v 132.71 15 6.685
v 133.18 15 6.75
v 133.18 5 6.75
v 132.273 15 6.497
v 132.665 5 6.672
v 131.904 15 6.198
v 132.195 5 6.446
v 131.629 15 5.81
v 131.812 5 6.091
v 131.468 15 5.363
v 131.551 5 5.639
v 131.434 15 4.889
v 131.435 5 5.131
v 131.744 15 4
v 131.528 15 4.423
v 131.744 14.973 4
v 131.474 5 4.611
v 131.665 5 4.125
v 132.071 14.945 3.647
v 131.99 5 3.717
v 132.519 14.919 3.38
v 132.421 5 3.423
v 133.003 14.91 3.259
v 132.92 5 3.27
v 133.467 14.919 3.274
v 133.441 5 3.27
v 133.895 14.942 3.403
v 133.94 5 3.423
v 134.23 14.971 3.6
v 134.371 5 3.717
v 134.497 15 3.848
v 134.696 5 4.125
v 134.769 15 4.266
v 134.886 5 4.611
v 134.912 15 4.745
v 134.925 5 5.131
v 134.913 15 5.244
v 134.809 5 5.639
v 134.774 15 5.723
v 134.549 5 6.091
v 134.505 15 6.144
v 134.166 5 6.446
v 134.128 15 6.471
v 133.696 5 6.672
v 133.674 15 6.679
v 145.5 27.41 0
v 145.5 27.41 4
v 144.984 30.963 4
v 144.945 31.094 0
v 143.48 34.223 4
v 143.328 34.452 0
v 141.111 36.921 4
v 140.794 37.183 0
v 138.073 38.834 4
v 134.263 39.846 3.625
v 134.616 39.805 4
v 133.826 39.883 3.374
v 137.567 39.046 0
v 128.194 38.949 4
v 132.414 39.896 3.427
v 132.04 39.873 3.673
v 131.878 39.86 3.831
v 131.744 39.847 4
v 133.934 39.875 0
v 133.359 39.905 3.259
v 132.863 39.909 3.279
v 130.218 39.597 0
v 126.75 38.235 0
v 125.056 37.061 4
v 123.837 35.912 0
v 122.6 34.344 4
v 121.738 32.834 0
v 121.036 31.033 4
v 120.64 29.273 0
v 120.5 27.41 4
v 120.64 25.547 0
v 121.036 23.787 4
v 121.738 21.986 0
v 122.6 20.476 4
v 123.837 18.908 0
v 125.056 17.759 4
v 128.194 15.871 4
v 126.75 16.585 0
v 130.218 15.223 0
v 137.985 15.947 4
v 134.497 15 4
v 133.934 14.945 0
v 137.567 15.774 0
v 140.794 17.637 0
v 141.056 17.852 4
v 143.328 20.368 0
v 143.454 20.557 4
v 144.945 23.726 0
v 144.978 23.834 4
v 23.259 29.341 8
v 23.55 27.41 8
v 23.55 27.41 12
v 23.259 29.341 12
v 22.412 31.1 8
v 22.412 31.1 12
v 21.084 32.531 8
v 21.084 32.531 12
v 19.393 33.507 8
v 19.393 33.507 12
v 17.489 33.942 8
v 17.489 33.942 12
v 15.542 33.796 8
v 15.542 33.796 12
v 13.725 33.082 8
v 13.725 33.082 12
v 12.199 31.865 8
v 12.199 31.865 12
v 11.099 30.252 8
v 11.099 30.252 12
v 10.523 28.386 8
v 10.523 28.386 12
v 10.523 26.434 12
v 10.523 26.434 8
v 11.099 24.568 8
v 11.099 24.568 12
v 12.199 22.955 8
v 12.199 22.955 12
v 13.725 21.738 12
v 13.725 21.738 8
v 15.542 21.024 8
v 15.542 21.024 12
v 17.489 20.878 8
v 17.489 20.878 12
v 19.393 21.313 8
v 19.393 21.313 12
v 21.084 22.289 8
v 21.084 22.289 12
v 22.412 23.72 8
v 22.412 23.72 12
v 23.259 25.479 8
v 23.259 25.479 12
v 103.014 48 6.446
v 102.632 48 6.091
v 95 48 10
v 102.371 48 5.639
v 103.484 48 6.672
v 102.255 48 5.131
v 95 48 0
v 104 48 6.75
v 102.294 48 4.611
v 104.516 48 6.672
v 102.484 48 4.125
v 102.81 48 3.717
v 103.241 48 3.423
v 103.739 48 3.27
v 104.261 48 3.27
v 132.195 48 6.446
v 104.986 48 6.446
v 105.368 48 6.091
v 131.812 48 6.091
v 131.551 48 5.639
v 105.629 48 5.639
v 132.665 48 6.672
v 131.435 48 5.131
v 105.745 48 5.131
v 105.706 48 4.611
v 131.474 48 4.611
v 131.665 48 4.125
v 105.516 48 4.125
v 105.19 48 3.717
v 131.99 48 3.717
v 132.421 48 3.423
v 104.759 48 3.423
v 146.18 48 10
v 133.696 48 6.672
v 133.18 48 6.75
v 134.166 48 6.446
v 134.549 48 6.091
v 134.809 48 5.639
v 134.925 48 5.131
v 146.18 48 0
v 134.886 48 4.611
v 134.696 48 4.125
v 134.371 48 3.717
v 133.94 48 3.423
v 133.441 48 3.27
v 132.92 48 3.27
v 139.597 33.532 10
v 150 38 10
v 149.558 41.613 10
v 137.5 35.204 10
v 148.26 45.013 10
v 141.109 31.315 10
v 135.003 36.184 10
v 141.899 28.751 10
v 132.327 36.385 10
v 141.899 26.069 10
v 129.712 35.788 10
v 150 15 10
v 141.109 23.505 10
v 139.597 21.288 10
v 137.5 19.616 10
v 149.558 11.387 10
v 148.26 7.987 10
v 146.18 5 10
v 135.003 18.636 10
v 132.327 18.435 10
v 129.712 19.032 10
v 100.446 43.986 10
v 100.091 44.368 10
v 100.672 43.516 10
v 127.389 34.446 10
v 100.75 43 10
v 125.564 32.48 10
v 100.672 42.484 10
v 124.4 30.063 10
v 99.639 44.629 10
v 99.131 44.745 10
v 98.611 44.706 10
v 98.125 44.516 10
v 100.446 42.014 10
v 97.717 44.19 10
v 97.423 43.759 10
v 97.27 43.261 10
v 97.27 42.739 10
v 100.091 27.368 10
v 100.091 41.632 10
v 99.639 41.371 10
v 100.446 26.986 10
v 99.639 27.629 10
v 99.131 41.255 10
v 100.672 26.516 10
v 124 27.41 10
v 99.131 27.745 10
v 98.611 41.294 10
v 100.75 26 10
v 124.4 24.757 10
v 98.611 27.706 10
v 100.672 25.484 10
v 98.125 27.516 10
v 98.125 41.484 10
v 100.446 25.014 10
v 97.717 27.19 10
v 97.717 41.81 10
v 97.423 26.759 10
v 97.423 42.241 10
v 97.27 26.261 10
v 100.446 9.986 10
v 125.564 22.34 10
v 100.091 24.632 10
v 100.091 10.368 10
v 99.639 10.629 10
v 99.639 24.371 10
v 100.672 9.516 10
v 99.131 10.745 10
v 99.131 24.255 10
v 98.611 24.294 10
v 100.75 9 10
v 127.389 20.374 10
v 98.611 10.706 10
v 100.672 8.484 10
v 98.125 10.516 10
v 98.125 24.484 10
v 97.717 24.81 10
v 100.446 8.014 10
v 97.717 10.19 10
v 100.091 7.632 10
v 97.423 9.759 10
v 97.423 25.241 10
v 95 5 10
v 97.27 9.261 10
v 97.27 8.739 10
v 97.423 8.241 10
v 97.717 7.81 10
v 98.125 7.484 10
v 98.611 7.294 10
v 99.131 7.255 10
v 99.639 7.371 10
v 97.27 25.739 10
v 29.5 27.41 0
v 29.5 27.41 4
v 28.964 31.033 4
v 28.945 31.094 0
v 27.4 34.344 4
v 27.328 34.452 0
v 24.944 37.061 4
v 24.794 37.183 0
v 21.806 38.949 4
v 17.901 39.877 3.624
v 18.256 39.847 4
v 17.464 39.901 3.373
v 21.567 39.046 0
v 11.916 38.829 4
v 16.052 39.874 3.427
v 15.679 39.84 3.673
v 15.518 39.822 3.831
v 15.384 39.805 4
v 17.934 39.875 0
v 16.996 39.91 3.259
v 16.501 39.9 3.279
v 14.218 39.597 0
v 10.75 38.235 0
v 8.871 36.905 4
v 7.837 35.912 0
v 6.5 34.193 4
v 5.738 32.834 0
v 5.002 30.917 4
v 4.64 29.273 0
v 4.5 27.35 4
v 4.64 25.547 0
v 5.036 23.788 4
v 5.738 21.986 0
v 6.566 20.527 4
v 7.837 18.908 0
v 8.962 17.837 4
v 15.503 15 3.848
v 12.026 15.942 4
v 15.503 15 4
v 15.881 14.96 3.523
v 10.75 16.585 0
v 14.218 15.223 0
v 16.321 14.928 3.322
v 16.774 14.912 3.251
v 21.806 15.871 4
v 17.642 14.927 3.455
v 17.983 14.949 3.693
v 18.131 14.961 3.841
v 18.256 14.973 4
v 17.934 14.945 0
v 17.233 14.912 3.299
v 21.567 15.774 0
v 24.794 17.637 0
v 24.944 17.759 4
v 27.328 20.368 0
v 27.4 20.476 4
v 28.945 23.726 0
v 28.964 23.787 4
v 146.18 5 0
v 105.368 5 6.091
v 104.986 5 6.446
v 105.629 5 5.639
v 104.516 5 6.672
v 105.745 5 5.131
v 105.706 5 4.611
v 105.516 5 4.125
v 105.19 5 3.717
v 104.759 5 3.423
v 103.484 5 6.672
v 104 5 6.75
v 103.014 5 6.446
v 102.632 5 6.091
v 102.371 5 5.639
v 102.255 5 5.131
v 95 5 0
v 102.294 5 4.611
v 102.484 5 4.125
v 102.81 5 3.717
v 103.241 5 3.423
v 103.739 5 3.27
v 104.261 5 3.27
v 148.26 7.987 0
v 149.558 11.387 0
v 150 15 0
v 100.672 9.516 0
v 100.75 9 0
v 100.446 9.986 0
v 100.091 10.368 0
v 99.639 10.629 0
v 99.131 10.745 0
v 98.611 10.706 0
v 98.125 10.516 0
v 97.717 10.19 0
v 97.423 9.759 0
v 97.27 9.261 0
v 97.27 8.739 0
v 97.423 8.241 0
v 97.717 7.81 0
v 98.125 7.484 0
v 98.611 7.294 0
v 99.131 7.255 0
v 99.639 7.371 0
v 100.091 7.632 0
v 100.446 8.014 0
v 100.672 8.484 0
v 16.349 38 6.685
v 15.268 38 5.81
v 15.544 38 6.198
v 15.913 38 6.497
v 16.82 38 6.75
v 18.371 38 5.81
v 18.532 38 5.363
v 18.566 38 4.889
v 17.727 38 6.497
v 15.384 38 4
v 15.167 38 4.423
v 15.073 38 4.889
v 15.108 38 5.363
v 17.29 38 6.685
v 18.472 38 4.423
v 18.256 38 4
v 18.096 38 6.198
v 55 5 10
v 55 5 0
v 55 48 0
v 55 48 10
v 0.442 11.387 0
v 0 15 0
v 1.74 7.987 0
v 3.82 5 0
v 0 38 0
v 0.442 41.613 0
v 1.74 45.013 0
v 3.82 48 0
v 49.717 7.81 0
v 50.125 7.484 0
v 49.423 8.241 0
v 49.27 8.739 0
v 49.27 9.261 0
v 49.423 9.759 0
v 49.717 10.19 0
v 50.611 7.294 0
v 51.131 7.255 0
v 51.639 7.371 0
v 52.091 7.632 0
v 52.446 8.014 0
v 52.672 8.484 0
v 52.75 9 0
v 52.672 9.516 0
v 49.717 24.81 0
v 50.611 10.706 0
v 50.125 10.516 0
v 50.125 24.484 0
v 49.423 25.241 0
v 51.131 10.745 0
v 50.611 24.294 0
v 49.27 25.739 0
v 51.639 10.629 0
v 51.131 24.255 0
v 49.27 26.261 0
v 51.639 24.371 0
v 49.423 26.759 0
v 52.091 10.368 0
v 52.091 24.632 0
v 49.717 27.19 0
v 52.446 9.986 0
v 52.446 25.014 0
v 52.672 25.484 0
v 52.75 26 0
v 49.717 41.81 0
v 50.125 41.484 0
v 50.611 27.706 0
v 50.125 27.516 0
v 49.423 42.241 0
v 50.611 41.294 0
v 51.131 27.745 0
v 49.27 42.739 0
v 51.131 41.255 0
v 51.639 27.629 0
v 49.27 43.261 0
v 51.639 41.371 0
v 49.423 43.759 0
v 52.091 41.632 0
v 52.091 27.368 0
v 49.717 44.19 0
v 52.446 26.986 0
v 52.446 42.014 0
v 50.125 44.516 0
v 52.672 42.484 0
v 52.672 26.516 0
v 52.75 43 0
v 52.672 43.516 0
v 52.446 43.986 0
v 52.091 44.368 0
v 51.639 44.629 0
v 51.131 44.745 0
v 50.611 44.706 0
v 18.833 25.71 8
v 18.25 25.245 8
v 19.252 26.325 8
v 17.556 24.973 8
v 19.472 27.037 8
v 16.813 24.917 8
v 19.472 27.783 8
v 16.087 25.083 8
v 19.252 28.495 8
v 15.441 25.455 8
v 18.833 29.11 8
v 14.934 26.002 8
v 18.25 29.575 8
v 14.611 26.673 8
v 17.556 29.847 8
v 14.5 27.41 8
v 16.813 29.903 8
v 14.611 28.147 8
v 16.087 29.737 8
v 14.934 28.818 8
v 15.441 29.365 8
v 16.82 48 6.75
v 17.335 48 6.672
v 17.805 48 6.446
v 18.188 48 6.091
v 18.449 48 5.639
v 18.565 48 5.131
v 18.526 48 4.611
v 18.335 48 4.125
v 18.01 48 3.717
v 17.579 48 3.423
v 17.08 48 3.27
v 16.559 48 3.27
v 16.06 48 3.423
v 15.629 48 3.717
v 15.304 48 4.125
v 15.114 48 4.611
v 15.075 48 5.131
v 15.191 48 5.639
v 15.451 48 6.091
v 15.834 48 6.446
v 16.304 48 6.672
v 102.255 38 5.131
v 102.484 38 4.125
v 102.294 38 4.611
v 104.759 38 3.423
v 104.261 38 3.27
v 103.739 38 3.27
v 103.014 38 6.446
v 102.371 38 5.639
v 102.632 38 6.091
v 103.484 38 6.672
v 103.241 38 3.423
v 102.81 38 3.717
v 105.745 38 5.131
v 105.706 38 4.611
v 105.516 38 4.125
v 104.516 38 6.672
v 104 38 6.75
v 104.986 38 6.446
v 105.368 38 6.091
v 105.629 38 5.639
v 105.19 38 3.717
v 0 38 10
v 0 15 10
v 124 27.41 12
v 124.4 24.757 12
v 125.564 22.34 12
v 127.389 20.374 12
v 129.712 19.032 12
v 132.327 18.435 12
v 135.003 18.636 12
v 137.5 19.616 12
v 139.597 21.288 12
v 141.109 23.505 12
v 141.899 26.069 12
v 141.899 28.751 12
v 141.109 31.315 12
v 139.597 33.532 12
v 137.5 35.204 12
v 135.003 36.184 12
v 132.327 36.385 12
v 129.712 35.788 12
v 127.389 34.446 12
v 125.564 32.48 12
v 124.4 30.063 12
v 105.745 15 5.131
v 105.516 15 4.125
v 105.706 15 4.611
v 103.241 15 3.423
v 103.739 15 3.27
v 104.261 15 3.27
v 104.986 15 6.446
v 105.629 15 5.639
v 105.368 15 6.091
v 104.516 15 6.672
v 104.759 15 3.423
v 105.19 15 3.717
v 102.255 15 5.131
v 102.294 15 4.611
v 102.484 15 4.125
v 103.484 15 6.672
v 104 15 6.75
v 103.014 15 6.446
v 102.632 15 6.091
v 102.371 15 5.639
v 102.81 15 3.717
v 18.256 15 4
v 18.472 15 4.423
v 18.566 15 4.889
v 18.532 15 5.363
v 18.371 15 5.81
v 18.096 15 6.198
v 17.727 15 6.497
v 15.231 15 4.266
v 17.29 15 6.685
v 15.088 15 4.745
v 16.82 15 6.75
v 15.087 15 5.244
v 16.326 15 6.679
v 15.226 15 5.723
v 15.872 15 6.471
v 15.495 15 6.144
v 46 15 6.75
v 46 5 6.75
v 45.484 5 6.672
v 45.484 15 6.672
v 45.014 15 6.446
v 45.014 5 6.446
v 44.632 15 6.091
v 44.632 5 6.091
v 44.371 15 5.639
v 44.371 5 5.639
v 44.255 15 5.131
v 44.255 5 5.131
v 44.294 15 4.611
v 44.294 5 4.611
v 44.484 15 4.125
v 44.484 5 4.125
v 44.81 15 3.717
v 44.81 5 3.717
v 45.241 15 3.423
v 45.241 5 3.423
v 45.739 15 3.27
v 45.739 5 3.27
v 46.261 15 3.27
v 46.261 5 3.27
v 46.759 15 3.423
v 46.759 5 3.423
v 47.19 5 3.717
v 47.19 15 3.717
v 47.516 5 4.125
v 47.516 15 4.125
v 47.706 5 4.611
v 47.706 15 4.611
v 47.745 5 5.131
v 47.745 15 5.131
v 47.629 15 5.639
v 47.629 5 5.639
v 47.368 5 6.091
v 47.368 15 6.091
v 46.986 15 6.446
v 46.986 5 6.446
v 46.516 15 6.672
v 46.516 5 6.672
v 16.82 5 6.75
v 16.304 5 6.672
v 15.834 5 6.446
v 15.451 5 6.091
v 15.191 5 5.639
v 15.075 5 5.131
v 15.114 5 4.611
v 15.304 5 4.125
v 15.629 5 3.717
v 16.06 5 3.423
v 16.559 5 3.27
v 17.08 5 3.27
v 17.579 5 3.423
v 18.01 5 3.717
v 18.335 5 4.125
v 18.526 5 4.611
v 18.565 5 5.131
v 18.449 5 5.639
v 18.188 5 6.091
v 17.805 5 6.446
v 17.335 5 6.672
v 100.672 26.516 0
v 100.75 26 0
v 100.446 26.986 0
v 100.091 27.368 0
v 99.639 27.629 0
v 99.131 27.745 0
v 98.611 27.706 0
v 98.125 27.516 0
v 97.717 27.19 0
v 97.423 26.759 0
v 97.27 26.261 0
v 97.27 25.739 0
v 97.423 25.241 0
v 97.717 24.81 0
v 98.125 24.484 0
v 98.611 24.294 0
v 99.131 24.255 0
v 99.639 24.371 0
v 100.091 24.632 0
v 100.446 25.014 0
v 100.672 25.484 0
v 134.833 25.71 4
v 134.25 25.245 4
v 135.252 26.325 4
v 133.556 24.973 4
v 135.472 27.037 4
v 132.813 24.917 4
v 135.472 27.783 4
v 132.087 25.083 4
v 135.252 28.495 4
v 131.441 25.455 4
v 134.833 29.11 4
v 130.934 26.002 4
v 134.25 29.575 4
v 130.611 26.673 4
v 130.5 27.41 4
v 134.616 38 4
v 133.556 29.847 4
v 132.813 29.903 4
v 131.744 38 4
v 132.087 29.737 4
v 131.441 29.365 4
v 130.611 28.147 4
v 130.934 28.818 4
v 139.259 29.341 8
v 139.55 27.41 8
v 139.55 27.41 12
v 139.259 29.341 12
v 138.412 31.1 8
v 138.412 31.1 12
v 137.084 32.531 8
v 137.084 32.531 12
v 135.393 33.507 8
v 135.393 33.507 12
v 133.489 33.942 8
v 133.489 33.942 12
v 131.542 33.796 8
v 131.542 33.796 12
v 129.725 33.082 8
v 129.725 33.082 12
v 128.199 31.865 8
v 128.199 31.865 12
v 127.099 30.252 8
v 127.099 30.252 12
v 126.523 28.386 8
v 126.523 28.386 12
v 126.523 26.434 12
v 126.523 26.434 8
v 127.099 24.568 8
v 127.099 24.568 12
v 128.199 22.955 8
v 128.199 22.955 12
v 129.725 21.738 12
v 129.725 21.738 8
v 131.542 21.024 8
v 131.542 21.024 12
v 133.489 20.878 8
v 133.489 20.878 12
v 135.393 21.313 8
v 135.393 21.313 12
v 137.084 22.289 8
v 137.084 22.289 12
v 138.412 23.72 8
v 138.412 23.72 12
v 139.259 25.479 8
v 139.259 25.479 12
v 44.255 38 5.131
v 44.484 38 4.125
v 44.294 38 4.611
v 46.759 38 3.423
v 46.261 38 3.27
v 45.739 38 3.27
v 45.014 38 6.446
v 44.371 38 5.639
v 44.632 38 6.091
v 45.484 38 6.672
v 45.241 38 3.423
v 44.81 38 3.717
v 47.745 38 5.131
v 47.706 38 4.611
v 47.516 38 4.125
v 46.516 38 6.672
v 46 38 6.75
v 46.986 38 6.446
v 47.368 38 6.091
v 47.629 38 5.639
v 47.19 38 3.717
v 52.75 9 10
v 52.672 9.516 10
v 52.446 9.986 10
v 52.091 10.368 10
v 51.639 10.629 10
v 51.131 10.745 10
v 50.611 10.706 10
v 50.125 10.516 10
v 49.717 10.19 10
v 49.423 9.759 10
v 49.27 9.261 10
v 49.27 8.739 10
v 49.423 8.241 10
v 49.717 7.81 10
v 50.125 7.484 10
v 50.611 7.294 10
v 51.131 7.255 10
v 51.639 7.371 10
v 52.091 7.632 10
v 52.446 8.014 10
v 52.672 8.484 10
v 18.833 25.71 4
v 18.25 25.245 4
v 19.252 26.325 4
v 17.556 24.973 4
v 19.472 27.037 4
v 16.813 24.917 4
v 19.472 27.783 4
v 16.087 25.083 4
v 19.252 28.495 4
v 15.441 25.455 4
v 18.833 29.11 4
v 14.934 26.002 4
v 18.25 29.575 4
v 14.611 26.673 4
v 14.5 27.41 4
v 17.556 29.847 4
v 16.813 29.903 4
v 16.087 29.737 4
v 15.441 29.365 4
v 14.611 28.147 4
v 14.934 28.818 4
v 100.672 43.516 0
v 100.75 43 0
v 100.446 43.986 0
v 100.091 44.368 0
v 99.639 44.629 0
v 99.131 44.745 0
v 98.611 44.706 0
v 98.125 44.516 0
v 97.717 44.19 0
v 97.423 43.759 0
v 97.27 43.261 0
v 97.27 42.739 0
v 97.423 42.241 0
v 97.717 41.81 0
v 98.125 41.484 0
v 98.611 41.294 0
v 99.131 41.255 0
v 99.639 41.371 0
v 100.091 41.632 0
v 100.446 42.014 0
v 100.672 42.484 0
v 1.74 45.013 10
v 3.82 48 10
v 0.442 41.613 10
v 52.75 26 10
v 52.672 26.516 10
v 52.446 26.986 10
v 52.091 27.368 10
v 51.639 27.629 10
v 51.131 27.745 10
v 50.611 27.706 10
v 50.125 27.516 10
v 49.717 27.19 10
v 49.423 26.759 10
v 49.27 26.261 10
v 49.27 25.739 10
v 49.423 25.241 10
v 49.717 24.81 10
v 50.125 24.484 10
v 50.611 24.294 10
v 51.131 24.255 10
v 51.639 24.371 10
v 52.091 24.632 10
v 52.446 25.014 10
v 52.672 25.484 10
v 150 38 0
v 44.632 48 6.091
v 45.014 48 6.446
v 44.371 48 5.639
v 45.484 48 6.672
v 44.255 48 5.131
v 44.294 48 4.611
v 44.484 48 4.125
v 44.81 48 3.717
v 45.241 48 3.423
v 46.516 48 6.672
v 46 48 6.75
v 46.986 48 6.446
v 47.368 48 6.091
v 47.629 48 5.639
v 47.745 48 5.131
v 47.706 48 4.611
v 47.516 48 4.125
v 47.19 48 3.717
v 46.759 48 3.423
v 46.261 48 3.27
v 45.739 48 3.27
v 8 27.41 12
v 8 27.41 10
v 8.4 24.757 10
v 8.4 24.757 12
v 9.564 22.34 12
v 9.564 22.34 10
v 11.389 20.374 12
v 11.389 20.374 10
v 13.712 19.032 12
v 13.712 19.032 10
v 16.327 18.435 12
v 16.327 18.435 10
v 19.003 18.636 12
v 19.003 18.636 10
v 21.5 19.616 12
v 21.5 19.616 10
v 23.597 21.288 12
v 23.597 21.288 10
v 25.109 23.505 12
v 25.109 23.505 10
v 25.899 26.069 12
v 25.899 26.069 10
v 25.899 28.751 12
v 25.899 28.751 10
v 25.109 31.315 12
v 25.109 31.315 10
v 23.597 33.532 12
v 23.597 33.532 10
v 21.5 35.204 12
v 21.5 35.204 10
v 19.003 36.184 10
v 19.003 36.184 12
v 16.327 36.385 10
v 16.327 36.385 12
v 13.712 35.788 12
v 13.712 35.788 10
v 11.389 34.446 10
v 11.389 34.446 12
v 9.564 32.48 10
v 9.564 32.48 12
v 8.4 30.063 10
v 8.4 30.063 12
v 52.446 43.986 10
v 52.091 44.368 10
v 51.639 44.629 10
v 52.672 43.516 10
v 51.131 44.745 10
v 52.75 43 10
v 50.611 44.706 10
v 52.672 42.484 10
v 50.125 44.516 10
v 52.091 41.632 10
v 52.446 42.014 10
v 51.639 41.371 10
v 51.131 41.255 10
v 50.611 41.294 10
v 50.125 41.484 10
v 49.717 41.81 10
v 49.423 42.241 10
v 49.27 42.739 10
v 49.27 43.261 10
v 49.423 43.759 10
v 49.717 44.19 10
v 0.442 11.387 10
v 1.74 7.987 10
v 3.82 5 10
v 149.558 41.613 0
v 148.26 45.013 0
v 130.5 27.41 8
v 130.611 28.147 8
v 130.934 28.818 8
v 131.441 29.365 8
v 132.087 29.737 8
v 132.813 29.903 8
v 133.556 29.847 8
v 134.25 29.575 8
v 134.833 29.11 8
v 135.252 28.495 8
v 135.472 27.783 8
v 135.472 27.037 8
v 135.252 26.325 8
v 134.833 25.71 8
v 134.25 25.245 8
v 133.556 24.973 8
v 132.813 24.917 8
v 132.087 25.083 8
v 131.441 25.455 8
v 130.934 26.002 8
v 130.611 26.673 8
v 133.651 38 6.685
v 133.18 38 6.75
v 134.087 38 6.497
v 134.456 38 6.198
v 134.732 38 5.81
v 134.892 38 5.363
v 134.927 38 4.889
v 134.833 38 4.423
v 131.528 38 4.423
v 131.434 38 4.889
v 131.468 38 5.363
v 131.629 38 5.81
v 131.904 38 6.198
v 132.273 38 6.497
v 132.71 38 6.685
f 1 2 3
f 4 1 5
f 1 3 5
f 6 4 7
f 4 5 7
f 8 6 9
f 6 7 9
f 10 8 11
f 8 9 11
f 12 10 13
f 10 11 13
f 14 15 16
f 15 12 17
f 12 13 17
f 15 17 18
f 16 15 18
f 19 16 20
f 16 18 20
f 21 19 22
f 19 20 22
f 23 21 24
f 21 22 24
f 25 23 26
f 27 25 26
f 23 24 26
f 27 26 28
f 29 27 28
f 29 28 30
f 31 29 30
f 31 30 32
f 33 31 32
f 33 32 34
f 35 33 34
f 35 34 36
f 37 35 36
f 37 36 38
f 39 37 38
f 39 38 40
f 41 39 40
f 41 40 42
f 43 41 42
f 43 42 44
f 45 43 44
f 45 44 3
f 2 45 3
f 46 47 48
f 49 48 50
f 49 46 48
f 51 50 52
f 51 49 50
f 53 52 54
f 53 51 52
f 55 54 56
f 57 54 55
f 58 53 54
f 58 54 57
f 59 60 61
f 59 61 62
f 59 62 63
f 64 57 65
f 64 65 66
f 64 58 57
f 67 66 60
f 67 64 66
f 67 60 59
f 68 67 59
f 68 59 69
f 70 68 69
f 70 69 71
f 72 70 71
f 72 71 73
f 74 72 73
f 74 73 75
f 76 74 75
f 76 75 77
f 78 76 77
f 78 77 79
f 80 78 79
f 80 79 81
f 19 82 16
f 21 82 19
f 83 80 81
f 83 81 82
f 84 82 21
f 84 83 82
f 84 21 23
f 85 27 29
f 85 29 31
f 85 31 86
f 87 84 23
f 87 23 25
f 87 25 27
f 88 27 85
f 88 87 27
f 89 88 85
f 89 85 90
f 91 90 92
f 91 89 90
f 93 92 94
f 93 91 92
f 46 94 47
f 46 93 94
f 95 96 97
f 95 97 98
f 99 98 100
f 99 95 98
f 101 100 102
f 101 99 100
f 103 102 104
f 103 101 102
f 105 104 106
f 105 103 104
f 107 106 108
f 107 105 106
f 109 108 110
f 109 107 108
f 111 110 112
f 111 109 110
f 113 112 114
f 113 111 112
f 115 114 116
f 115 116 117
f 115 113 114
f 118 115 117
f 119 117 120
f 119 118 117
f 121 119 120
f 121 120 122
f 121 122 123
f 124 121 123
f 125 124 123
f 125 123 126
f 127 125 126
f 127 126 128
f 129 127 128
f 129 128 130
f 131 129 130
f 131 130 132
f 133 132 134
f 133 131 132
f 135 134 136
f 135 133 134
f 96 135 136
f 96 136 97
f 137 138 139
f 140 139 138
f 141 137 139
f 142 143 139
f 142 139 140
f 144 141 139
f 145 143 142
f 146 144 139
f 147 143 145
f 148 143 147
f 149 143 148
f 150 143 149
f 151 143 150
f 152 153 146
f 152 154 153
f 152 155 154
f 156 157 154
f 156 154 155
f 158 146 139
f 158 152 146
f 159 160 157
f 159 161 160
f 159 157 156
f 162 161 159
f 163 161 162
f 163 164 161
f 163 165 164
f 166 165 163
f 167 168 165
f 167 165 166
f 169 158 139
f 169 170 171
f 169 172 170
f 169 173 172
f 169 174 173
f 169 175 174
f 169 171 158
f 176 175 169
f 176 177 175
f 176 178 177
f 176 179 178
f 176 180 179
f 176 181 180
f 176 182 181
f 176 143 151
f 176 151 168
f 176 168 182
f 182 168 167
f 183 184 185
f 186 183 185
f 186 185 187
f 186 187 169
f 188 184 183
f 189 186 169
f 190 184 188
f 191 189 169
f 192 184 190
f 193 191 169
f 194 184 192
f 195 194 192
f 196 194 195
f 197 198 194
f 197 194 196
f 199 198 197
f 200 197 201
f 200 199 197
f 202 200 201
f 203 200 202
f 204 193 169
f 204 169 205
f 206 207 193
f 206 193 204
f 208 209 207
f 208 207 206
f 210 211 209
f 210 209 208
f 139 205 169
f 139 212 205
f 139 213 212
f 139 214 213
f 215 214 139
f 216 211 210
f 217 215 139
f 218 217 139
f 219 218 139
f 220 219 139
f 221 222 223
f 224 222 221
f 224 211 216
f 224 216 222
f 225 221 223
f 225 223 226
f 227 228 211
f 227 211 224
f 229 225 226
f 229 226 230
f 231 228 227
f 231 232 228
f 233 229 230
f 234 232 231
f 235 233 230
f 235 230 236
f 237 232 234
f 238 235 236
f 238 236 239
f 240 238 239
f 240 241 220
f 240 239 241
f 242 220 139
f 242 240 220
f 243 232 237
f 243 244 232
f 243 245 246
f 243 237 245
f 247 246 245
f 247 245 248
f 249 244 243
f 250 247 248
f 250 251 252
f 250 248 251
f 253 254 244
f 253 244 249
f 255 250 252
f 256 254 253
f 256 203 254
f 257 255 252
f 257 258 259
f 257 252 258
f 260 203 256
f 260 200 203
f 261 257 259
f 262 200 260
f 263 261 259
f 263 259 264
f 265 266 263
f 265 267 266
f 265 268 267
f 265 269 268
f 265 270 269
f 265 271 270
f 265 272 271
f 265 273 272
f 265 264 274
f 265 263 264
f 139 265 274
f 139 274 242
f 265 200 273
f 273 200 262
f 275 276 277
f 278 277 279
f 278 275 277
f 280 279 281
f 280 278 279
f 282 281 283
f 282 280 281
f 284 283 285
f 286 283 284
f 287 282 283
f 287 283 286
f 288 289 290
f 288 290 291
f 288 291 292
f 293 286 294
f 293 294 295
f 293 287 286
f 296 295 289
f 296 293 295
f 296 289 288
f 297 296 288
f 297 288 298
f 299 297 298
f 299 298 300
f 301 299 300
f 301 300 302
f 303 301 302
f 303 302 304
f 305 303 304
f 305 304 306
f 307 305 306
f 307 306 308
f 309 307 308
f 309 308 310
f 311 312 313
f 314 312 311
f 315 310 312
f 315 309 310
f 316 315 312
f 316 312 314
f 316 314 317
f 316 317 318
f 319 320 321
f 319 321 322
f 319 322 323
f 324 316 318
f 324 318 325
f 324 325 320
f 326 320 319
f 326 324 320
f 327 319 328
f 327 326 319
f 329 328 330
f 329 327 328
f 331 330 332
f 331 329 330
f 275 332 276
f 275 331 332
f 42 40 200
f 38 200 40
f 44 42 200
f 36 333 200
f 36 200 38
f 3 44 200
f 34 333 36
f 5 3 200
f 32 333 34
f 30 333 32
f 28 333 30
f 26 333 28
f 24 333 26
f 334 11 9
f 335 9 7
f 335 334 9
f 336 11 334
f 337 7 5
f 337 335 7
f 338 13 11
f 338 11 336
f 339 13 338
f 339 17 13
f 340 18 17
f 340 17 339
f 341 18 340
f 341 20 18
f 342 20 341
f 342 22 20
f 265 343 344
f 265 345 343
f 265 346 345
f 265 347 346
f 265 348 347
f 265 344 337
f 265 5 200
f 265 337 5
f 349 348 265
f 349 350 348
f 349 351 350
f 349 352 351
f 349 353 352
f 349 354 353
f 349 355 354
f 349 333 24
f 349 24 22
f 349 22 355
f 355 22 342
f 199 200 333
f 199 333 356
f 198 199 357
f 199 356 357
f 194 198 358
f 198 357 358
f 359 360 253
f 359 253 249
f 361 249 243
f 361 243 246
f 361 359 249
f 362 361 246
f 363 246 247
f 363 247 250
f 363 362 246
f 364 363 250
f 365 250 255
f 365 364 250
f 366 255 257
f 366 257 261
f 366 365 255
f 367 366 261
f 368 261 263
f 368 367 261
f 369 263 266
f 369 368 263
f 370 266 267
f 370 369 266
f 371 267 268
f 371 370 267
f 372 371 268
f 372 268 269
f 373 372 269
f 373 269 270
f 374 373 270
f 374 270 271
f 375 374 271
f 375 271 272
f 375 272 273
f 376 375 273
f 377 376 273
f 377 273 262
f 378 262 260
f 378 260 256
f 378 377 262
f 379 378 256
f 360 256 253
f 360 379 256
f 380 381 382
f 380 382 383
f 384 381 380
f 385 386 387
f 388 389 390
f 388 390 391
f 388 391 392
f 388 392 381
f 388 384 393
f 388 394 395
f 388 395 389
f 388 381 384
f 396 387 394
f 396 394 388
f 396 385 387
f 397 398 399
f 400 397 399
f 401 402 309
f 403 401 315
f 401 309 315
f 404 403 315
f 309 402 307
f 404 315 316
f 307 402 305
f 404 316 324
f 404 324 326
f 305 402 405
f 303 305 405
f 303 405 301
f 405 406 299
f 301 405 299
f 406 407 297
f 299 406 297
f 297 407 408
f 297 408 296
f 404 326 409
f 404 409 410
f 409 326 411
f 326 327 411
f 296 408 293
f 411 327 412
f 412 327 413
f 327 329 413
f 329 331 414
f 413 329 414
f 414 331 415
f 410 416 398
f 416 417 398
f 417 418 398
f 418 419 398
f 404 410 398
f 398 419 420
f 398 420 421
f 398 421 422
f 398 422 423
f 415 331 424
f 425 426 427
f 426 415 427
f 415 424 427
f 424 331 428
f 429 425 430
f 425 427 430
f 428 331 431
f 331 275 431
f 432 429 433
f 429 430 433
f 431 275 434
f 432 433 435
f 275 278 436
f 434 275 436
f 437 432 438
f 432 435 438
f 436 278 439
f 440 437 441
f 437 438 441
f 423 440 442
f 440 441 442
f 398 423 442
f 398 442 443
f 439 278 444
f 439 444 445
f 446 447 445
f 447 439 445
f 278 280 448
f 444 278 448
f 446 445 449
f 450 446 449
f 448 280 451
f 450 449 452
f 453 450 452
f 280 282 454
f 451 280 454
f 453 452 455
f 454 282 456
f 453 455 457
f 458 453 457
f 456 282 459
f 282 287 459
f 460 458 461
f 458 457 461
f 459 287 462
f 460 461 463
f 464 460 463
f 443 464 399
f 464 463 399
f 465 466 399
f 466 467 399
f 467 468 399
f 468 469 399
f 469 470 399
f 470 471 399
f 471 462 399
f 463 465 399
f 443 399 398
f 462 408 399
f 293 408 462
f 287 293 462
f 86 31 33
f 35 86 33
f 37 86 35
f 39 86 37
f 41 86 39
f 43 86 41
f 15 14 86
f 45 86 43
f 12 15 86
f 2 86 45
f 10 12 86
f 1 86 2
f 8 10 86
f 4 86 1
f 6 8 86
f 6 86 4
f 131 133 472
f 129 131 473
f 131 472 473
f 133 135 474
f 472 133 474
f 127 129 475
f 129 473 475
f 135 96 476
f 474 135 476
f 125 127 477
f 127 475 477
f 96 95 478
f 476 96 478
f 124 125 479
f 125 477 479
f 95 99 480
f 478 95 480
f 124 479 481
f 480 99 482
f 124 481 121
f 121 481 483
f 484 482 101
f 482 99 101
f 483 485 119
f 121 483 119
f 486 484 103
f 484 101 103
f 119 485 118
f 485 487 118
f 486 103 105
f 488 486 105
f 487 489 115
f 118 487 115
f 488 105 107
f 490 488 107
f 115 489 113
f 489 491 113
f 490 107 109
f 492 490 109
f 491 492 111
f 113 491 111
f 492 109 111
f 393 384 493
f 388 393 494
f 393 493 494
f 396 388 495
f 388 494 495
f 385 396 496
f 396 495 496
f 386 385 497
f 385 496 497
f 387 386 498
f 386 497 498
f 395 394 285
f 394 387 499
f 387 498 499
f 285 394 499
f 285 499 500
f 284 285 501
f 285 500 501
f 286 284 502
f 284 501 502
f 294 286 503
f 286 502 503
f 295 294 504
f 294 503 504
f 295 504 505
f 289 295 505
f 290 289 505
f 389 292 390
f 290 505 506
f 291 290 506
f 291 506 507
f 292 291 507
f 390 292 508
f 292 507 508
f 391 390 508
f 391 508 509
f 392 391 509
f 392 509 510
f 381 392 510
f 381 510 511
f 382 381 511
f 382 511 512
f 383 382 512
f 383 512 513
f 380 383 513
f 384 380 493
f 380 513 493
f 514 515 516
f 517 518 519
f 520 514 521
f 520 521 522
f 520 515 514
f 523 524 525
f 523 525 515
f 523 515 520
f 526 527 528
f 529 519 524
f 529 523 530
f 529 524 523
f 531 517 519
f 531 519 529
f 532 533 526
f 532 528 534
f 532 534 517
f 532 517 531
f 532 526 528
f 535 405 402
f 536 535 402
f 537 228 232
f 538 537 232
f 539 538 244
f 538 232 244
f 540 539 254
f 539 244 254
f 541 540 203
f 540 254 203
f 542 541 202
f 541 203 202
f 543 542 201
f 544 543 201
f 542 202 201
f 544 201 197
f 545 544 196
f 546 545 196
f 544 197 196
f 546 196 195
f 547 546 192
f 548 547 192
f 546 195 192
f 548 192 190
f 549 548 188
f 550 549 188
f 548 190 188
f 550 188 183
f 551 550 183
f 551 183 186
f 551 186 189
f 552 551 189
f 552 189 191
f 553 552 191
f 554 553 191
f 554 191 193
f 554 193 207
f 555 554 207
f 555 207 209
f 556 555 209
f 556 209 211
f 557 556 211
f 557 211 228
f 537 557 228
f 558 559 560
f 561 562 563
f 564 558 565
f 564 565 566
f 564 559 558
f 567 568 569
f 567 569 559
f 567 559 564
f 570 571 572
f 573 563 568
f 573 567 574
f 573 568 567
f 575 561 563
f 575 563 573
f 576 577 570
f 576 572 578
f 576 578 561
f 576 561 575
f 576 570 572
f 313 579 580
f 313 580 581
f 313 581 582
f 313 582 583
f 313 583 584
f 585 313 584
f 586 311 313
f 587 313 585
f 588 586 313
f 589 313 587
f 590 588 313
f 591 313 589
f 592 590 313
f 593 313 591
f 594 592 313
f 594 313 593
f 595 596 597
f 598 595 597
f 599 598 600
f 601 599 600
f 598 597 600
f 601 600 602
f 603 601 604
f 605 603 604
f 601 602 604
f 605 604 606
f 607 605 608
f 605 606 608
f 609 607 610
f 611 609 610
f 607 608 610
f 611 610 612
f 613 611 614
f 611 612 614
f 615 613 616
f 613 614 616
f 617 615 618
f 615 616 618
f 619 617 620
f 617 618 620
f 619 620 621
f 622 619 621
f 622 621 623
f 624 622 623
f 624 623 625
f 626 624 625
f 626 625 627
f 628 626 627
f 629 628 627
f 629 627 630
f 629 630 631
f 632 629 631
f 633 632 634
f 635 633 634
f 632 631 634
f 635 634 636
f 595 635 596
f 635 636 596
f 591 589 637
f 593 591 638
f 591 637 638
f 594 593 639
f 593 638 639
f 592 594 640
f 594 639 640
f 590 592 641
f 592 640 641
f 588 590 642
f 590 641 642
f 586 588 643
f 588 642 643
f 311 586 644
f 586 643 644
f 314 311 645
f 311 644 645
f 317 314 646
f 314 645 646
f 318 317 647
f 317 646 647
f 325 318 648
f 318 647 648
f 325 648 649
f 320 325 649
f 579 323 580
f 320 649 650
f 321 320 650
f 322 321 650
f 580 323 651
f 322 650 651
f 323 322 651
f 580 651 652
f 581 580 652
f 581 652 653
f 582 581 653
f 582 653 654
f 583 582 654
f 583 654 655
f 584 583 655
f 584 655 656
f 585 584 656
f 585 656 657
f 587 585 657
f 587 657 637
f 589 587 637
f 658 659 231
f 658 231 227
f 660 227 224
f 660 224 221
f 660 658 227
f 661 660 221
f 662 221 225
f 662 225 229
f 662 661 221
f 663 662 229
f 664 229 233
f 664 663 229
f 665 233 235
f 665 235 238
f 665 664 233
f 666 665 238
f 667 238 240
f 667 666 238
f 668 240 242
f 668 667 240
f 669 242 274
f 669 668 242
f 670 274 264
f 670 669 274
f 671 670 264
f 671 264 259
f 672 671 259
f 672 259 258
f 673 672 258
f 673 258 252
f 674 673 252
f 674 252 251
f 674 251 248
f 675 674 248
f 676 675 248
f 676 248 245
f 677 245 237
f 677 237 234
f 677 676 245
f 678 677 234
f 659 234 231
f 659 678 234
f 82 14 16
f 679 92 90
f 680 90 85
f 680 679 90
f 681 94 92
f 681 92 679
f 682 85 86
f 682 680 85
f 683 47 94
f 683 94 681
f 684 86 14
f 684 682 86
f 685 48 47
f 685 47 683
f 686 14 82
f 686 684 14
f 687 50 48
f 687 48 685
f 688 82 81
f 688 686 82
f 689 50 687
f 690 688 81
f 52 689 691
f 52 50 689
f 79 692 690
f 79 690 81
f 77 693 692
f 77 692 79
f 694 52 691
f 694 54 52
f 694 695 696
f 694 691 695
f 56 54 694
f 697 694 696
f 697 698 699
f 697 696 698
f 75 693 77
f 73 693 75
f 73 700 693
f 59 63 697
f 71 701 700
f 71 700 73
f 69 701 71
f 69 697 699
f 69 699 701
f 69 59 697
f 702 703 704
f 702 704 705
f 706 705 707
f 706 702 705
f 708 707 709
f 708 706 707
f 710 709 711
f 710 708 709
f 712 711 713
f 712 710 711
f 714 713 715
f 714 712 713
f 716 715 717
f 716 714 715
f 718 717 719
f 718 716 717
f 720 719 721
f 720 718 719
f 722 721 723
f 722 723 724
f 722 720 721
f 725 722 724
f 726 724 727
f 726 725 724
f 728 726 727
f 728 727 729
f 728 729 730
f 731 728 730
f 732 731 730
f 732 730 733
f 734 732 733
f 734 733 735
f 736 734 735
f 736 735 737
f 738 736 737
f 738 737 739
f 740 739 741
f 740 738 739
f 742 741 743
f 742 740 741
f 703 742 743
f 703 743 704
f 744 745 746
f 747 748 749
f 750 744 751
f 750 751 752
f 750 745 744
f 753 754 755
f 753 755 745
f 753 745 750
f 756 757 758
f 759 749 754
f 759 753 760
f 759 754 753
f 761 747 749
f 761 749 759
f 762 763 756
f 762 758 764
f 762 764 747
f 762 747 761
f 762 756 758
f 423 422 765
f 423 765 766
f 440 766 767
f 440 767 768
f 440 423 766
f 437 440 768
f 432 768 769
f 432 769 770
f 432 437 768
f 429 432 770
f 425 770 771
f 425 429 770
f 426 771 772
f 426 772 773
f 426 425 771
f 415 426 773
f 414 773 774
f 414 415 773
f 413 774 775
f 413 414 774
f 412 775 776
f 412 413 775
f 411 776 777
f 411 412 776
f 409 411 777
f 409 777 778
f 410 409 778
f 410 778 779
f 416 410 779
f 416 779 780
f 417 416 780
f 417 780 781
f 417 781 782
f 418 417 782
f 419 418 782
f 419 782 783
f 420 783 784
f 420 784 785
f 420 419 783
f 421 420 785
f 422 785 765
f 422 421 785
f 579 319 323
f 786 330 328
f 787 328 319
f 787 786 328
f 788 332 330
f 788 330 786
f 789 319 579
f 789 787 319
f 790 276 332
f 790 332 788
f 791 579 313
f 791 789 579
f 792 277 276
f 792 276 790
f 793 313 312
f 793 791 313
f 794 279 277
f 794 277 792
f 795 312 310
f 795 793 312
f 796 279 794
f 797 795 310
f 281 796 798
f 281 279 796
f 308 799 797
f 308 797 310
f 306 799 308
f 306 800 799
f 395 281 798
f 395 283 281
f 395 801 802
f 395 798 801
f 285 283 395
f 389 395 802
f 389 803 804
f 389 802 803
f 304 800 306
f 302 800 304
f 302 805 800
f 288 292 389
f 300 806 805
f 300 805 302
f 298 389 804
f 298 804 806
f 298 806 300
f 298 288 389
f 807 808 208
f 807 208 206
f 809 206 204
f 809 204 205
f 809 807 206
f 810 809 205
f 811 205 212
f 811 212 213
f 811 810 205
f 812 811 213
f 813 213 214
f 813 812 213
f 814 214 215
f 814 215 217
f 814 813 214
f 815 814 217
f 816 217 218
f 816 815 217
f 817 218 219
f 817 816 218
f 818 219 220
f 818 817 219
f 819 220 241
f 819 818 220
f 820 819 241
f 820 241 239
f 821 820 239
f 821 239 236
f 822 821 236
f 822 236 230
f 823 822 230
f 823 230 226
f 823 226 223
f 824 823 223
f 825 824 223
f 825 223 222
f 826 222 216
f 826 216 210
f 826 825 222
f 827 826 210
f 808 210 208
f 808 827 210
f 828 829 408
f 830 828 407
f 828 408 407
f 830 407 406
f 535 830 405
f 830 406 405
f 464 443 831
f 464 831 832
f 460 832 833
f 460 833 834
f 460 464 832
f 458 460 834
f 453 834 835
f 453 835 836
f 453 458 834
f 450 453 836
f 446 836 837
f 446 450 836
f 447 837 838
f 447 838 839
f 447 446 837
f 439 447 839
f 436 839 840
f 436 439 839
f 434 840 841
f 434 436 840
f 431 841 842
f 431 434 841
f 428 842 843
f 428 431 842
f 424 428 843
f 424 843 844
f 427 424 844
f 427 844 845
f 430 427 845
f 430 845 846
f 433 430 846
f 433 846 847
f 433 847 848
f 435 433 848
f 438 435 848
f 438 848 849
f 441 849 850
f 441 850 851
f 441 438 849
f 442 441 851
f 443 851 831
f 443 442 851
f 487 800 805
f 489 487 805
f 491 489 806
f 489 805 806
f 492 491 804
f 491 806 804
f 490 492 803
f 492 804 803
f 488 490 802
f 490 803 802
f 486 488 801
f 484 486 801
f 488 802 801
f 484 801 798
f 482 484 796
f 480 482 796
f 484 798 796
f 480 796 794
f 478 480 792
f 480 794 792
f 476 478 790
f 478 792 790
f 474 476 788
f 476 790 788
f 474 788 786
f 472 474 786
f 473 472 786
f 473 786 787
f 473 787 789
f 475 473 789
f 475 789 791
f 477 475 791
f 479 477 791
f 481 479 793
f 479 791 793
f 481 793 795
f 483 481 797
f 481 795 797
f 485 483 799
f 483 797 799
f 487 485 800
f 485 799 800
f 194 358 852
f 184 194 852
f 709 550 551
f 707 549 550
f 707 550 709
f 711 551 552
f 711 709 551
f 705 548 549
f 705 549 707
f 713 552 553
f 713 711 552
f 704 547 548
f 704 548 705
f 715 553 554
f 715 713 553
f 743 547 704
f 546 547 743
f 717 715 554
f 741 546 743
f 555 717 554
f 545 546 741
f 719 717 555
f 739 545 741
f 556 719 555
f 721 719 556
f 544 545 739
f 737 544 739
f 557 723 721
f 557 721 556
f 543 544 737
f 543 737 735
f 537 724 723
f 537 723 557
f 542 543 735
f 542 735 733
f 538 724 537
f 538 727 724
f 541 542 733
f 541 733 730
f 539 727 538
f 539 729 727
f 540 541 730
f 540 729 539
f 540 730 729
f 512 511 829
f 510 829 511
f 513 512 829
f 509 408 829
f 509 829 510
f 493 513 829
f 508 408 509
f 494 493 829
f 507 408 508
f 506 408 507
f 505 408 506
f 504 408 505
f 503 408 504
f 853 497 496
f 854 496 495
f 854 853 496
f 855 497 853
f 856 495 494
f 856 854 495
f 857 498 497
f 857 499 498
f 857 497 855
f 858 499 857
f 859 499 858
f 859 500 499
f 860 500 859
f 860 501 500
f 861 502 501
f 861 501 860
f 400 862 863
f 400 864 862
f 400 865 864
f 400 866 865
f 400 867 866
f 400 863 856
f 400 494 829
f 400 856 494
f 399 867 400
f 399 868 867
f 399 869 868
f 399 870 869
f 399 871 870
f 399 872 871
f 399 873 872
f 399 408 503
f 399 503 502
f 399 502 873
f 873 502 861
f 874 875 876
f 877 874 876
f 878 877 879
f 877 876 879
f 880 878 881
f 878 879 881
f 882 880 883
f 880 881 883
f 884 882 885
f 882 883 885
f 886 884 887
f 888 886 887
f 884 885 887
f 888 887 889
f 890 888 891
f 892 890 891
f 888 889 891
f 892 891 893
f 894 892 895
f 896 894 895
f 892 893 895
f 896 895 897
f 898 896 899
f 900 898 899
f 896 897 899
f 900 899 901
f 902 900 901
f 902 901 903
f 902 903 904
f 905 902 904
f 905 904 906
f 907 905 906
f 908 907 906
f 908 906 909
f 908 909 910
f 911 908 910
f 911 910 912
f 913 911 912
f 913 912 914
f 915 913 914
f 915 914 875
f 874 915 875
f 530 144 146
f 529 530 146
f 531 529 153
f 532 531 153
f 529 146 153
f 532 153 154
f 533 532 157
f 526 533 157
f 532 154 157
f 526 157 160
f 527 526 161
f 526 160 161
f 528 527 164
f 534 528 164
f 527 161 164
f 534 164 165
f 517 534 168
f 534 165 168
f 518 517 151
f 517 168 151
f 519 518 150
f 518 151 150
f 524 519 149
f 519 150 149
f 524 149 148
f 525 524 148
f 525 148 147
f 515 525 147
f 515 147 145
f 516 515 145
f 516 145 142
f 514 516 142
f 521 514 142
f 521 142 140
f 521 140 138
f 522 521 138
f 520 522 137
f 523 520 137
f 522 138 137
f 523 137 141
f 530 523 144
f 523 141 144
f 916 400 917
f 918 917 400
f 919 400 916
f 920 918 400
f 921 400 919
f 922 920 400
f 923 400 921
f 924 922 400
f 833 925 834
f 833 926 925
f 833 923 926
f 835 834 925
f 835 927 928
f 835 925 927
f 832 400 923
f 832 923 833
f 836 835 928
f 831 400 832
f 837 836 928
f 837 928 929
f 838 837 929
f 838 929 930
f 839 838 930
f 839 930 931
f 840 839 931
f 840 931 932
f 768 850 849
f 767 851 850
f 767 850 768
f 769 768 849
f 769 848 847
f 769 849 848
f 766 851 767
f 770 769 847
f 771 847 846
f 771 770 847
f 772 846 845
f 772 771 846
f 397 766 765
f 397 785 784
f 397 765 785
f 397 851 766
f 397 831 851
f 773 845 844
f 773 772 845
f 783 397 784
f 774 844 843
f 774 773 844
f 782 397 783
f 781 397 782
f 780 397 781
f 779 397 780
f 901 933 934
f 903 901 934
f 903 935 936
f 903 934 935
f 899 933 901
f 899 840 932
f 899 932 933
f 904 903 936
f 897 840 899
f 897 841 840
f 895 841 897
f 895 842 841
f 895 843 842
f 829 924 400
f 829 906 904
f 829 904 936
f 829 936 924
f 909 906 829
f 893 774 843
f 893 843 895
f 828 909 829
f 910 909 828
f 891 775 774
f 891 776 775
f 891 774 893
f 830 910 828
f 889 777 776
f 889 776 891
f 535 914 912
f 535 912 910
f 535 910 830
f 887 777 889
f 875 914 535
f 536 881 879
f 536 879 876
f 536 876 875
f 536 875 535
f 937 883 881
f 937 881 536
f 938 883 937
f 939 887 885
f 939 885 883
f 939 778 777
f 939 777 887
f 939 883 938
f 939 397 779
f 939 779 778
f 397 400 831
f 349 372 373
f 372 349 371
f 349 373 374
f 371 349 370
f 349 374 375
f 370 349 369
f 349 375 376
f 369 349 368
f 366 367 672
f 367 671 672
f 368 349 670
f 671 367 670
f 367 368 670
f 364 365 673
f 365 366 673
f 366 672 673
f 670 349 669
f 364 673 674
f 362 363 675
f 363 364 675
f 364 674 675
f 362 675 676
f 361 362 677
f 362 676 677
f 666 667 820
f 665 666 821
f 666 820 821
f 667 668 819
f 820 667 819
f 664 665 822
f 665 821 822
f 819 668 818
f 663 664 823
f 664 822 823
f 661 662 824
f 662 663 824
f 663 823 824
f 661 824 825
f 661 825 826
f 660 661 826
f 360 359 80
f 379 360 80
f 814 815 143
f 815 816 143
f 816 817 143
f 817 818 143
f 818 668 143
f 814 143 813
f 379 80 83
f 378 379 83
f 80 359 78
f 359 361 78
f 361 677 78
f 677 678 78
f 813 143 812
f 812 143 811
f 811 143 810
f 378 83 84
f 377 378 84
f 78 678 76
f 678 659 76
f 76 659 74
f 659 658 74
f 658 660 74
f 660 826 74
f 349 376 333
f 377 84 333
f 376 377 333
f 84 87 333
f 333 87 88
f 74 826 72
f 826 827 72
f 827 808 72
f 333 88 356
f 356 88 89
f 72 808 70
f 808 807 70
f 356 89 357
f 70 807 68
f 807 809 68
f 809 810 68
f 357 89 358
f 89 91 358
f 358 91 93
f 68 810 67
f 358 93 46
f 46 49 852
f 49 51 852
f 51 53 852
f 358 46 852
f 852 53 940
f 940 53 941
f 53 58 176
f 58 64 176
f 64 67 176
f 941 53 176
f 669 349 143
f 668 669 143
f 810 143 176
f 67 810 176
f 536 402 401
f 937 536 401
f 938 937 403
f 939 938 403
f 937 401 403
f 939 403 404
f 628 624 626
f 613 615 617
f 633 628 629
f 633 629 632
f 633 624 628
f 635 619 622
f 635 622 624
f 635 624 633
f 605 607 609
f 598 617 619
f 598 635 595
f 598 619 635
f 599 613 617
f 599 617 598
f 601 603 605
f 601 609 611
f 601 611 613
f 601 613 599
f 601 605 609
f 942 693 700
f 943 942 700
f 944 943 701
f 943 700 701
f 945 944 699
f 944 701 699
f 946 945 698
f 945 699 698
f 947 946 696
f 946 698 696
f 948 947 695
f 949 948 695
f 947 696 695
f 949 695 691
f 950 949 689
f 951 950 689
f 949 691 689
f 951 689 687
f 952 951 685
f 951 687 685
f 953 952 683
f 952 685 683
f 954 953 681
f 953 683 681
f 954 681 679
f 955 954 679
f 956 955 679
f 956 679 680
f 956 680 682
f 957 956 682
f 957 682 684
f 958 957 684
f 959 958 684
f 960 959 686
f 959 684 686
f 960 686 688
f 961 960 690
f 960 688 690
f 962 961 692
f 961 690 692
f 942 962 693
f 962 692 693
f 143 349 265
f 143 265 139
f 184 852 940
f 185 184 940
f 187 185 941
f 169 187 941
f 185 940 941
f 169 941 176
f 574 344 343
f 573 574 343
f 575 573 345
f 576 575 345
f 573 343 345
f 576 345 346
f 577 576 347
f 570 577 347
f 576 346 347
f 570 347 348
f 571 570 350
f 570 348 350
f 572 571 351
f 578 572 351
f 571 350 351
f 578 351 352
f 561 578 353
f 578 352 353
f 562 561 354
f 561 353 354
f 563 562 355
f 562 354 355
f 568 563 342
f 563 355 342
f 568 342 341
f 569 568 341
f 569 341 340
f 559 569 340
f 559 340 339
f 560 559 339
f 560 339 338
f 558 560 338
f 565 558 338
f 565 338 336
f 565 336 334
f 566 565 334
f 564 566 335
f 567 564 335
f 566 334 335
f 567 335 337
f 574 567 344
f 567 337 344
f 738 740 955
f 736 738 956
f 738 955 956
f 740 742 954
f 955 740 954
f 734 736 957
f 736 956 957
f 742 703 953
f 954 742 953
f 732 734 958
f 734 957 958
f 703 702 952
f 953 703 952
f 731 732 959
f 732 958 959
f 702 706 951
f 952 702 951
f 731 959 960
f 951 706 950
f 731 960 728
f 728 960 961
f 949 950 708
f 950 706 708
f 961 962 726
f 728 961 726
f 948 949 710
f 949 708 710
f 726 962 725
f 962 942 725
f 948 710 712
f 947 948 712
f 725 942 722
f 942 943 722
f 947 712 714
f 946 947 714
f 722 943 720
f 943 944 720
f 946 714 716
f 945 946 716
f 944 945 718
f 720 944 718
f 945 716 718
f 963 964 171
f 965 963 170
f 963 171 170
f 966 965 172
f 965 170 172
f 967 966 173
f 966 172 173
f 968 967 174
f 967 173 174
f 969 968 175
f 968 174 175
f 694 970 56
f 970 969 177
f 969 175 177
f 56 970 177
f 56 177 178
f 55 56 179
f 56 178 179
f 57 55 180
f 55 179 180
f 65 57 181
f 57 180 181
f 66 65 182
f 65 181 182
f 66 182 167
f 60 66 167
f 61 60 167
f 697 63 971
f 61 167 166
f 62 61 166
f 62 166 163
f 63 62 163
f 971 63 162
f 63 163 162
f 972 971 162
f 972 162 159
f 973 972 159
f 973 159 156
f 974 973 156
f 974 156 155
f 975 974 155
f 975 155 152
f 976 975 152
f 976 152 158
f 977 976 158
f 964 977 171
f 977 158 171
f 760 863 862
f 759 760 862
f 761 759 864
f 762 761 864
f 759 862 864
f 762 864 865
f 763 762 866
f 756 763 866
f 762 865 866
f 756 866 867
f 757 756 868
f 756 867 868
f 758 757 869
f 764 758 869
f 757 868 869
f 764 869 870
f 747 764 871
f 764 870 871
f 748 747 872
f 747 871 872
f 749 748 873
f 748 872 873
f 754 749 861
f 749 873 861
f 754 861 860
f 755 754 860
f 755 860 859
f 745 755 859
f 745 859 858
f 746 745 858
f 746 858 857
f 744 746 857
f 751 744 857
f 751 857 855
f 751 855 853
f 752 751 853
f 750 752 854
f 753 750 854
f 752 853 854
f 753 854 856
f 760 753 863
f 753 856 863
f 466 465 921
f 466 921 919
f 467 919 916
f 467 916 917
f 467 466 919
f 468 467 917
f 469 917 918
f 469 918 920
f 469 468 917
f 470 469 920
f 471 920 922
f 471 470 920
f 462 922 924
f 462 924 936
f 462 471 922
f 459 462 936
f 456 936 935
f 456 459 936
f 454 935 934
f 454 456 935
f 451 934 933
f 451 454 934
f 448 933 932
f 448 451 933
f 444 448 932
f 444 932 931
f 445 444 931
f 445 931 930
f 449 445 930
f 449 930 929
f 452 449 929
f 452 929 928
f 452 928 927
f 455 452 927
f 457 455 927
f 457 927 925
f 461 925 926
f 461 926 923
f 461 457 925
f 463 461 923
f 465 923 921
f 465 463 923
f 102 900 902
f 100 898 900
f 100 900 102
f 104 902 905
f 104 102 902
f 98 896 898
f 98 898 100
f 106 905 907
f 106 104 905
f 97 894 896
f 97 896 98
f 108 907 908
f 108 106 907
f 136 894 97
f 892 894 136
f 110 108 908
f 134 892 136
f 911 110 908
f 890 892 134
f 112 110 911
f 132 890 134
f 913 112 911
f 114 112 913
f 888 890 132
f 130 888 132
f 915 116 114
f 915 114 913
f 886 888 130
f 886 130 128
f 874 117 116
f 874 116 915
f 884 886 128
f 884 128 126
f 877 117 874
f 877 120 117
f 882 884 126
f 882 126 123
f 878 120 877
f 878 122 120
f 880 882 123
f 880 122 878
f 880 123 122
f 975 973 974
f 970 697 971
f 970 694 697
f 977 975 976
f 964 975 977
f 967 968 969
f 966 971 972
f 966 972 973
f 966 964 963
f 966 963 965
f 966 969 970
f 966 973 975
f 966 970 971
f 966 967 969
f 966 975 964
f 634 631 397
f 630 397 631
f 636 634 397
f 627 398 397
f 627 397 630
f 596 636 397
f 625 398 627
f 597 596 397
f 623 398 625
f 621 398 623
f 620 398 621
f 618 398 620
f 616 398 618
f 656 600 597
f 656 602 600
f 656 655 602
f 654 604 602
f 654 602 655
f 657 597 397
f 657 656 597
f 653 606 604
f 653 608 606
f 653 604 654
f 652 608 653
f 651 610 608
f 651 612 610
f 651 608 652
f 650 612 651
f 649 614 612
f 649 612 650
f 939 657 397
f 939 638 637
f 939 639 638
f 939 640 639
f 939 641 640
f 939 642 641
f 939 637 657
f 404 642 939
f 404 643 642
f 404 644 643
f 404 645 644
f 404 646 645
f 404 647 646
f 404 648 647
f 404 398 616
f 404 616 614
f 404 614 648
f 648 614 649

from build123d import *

# Parameters (mm, degrees)
IZIM1_W                      = 40
IZIM1_H                      = 43
IZIM1_R                      = 12.5
IZIM1_R_2                    = 1.75
Y_KSEKLIK_EKSTR_ZYON1_DEPTH  = 10
Y_KSEKLIK_EKSTR_ZYON8_START  = -4
IZIM7_R                      = 12.5
IZIM7_R_2                    = 2.5
Y_KSEKLIK_EKSTR_ZYON8_DEPTH  = 4
IZIM8_R                      = 9
IZIM8_R_2                    = 6.55
Y_KSEKLIK_EKSTR_ZYON9_DEPTH  = 4
L_O_ALTMA1_COUNT             = 2
L_O_ALTMA1_PITCH             = 116
KES_EKSTR_ZYON3_START        = -10
KES_EKSTR_ZYON3_DEPTH        = 10
IZIM13_R                     = 12.5
IZIM13_R_2                   = 9
Y_KSEKLIK_EKSTR_ZYON10_DEPTH = 2
IZIM12_R                     = 1.75
KES_EKSTR_ZYON4_DEPTH        = 10
IZIM14_R                     = 1.75
KES_EKSTR_ZYON5_DEPTH        = 10


with BuildPart() as part:
    # Çizim1 → Yükseklik-Ekstrüzyon1 (new body)
    with BuildSketch(Plane.XY):
        with BuildLine():
            ThreePointArc((0, 15), (4.393398282, 4.393398282), (15, 0))
            Line((15, 0), (135, 0))
            ThreePointArc((135, 0), (145.606601718, 4.393398282), (150, 15))
            Line((150, 15), (150, 38))
            ThreePointArc((150, 38), (145.606601718, 48.606601718), (135, 53))
            Line((135, 53), (15, 53))
            ThreePointArc((15, 53), (4.393398282, 48.606601718), (0, 38))
            Line((0, 38), (0, 15))
        make_face()
        with Locations((75, 26.5)):
            Rectangle(IZIM1_W, IZIM1_H, mode=Mode.SUBTRACT)
        with Locations((17, 27.41)):
            Circle(IZIM1_R, mode=Mode.SUBTRACT)
        with Locations((51, 43)):
            Circle(IZIM1_R_2, mode=Mode.SUBTRACT)
        with Locations((51, 9)):
            Circle(IZIM1_R_2, mode=Mode.SUBTRACT)
        with Locations((51, 26)):
            Circle(IZIM1_R_2, mode=Mode.SUBTRACT)
        with Locations((133, 27.41)):
            Circle(IZIM1_R, mode=Mode.SUBTRACT)
        with Locations((99, 26)):
            Circle(IZIM1_R_2, mode=Mode.SUBTRACT)
        with Locations((99, 9)):
            Circle(IZIM1_R_2, mode=Mode.SUBTRACT)
        with Locations((99, 43)):
            Circle(IZIM1_R_2, mode=Mode.SUBTRACT)
    extrude(amount=Y_KSEKLIK_EKSTR_ZYON1_DEPTH)

    # Çizim7 → Yükseklik-Ekstrüzyon8 (add)
    with BuildSketch(Plane(origin=(0, 0, 0), x_dir=(-1, 0, 0), z_dir=(0, 0, -1)).offset(Y_KSEKLIK_EKSTR_ZYON8_START)):
        with Locations((-133, 27.41)):
            Circle(IZIM7_R)
        with Locations((-133, 27.41)):
            Circle(IZIM7_R_2, mode=Mode.SUBTRACT)
    y_kseklik_ekstr_zyon8 = extrude(amount=-Y_KSEKLIK_EKSTR_ZYON8_DEPTH)

    # Çizim8 → Yükseklik-Ekstrüzyon9 (add)
    with BuildSketch(Plane.XY.offset(8)):
        with Locations(Location((133, 27.41, 0), (0, 0, 180))):
            Circle(IZIM8_R)
        with Locations((133, 27.41)):
            Circle(IZIM8_R_2, mode=Mode.SUBTRACT)
    y_kseklik_ekstr_zyon9 = extrude(amount=Y_KSEKLIK_EKSTR_ZYON9_DEPTH)

    # LÇoğaltma1: Yükseklik-Ekstrüzyon8, Yükseklik-Ekstrüzyon9 ×2
    with Locations(*[(-i * L_O_ALTMA1_PITCH, 0, 0) for i in range(1, L_O_ALTMA1_COUNT)]):
        add(y_kseklik_ekstr_zyon8)
        add(y_kseklik_ekstr_zyon9)

    # Çizim11 → Kes-Ekstrüzyon3 (cut)
    with BuildSketch(Plane.XY.offset(10).offset(KES_EKSTR_ZYON3_START)):
        with BuildLine():
            Line((146.180339887, 48), (150, 48))
            Line((150, 48), (156.054550849, 48))
            Line((156.054550849, 48), (156.054550849, 62.600281878))
            Line((156.054550849, 62.600281878), (0, 62.600281878))
            Line((0, 62.600281878), (0, 48))
            Line((0, 48), (3.819660113, 48))
            ThreePointArc((3.819660113, 48), (8.876275643, 51.693063938), (15, 53))
            Line((15, 53), (135, 53))
            ThreePointArc((135, 53), (141.123724357, 51.693063938), (146.180339887, 48))
        make_face()
        with BuildLine():
            Line((95, 48), (146.180339887, 48))
            ThreePointArc((146.180339887, 48), (141.123724357, 51.693063938), (135, 53))
            Line((135, 53), (15, 53))
            ThreePointArc((15, 53), (8.876275643, 51.693063938), (3.819660113, 48))
            Line((3.819660113, 48), (55, 48))
            Line((55, 48), (95, 48))
        make_face()
        with BuildLine():
            Line((146.180339887, 5), (95, 5))
            Line((95, 5), (55, 5))
            Line((55, 5), (3.819660113, 5))
            ThreePointArc((3.819660113, 5), (8.876275643, 1.306936062), (15, 0))
            Line((15, 0), (135, 0))
            ThreePointArc((135, 0), (141.123724357, 1.306936062), (146.180339887, 5))
        make_face()
        with BuildLine():
            Line((150, 5), (146.180339887, 5))
            ThreePointArc((146.180339887, 5), (141.123724357, 1.306936062), (135, 0))
            Line((135, 0), (15, 0))
            ThreePointArc((15, 0), (8.876275643, 1.306936062), (3.819660113, 5))
            Line((3.819660113, 5), (0, 5))
            Line((0, 5), (0, -18.687777451))
            Line((0, -18.687777451), (161.997781601, -18.687777451))
            Line((161.997781601, -18.687777451), (161.997781601, 5))
            Line((161.997781601, 5), (150, 5))
        make_face()
    extrude(amount=KES_EKSTR_ZYON3_DEPTH, mode=Mode.SUBTRACT)


with BuildPart() as kes_ekstr_zyon3_piece_1:
    # of the separate pieces the step leaves, piece 1, a body of its own (kes_ekstr_zyon3_pieces)
    add(part.part.solids().sort_by_distance((95, 48, 0))[0])



with BuildPart() as kes_ekstr_zyon3_piece_2:
    # of the separate pieces the step leaves, piece 2, a body of its own (kes_ekstr_zyon3_pieces)
    add(part.part.solids().sort_by_distance((0, 38, 0))[0])


with BuildPart() as kes_ekstr_zyon3_piece_1_1:
    add(kes_ekstr_zyon3_piece_1.part)

    add(kes_ekstr_zyon3_piece_2.part)  # Yükseklik-Ekstrüzyon10 merges Kes-Ekstrüzyon3 piece 2
    # Çizim13 → Yükseklik-Ekstrüzyon10 (add)
    # profile 1 of 2: a face of its own
    with BuildSketch(Plane.XY.offset(8)):
        with Locations(Location((133, 27.41, 0), (0, 0, 180))):
            Circle(IZIM13_R)
        with Locations((133, 27.41)):
            Circle(IZIM13_R_2, mode=Mode.SUBTRACT)
    # profile 2 of 2: a face of its own
    with BuildSketch(Plane.XY.offset(8)):
        with Locations(Location((17, 27.41, 0), (0, 0, 180))):
            Circle(IZIM13_R)
        with Locations((17, 27.41)):
            Circle(IZIM13_R_2, mode=Mode.SUBTRACT)
    extrude(amount=Y_KSEKLIK_EKSTR_ZYON10_DEPTH)

    # Çizim12 → Kes-Ekstrüzyon4 (cut)
    with BuildSketch(Plane(origin=(0, 48, 0), x_dir=(1, 0, 0), z_dir=(0, 1, 0))):
        with Locations(Location((46, -5, 0), (0, 0, 270))):
            Circle(IZIM12_R)
        with Locations(Location((16.819660113, -5, 0), (0, 0, 270))):
            Circle(IZIM12_R)
        with Locations(Location((104, -5, 0), (0, 0, 270))):
            Circle(IZIM12_R)
        with Locations(Location((133.180339887, -5, 0), (0, 0, 270))):
            Circle(IZIM12_R)
    extrude(amount=-KES_EKSTR_ZYON4_DEPTH, mode=Mode.SUBTRACT)

    # Çizim14 → Kes-Ekstrüzyon5 (cut)
    with BuildSketch(Plane.XZ.offset(-5)):
        with Locations(Location((16.819660113, 5, 0), (0, 0, 90))):
            Circle(IZIM14_R)
        with Locations(Location((46, 5, 0), (0, 0, 90))):
            Circle(IZIM14_R)
        with Locations(Location((104, 5, 0), (0, 0, 90))):
            Circle(IZIM14_R)
        with Locations(Location((133.180339887, 5, 0), (0, 0, 90))):
            Circle(IZIM14_R)
    extrude(amount=-KES_EKSTR_ZYON5_DEPTH, mode=Mode.SUBTRACT)


solid = kes_ekstr_zyon3_piece_1_1.part
